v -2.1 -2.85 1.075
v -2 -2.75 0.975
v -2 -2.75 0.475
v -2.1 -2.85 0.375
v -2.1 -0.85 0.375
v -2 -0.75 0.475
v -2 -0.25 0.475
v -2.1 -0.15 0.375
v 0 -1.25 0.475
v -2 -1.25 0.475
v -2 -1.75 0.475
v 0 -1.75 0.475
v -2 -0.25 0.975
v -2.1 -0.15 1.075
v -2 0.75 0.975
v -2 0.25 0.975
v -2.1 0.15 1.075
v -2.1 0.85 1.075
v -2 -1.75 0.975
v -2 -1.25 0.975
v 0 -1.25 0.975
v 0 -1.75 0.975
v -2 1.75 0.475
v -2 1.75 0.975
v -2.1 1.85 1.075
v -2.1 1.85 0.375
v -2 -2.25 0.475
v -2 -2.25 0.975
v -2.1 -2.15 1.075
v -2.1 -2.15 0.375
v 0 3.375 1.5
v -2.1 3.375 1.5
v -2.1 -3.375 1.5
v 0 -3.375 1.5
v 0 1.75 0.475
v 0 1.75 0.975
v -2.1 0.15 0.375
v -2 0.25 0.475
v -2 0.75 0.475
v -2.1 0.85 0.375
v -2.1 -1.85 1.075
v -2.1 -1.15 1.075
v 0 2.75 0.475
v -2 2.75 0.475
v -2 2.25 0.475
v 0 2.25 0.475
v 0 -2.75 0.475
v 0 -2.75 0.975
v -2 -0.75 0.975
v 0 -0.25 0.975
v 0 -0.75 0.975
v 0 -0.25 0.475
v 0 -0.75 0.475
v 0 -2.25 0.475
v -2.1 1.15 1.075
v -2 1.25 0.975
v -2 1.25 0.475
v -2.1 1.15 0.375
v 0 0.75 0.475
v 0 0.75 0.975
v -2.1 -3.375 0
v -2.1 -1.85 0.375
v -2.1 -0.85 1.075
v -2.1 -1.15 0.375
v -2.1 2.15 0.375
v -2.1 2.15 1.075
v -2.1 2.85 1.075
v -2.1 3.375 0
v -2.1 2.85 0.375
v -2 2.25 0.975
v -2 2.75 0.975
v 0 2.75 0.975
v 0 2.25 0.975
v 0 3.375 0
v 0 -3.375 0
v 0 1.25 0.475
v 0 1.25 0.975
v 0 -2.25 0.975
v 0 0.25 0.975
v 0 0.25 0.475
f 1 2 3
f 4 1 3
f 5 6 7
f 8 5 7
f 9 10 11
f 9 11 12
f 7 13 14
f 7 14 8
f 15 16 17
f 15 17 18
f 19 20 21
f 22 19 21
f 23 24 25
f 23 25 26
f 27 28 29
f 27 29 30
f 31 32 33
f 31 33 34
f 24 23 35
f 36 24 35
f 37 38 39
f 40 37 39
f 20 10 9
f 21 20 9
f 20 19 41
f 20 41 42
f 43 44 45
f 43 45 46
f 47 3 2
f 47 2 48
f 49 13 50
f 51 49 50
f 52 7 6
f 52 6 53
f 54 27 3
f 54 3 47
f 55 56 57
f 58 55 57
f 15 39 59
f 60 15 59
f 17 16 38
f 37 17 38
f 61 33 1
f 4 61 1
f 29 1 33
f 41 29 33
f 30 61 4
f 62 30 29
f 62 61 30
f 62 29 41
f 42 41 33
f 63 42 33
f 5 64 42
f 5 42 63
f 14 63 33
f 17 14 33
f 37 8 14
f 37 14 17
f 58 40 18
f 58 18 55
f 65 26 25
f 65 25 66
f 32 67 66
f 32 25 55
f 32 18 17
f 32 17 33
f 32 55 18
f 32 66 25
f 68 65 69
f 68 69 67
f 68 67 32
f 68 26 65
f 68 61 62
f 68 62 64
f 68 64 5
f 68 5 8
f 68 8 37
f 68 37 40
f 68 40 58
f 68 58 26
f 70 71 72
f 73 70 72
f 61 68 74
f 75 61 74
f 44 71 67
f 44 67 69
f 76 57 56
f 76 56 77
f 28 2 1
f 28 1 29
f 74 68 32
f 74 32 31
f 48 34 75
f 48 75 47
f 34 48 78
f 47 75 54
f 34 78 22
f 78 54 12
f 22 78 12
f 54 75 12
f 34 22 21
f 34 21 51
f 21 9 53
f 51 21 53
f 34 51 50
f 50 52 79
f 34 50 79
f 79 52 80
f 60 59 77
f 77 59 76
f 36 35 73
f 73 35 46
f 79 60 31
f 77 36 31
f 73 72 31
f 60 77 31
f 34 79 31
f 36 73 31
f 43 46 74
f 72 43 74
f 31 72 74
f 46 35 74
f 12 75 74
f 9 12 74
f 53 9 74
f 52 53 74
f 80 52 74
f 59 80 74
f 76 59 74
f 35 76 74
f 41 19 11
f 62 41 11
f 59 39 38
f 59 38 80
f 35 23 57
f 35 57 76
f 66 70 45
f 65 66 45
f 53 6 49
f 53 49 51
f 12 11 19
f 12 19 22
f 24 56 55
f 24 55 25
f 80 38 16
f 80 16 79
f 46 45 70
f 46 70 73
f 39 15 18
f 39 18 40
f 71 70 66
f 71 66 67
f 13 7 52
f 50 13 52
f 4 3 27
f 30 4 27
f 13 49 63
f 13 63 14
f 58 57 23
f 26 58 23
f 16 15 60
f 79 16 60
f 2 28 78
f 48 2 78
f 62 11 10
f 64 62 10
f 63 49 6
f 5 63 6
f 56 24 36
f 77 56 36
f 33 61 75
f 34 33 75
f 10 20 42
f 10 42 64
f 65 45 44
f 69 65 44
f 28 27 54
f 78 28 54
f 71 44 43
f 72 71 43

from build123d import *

# Parameters (mm, degrees)
BOX121_W        = 2.1
BOX121_H        = 6.75
BOX121_DEPTH    = 1.5
BOX122_W        = 3.5
BOX122_H        = 0.5
BOX122_DEPTH    = 0.5
BOX123_W        = 3.5
BOX123_H        = 0.5
BOX123_DEPTH    = 0.5
BOX124_W        = 3
BOX124_H        = 0.5
BOX124_DEPTH    = 0.5
BOX125_W        = 3.5
BOX125_H        = 0.5
BOX125_DEPTH    = 0.5
BOX126_W        = 3.5
BOX126_H        = 0.5
BOX126_DEPTH    = 0.5
BOX175_W        = 3.5
BOX175_H        = 0.5
BOX175_DEPTH    = 0.5
CHAMFER062_SIZE = 0.1


with BuildPart() as part:
    # Box121 → Box121 (join)
    with BuildSketch(Plane(origin=(-2.1, -1.375, 0), x_dir=(1, 0, 0), z_dir=(0, 0, 1))):
        with Locations((1.05, 3.375)):
            Rectangle(BOX121_W, BOX121_H)
    extrude(amount=BOX121_DEPTH)

    # Box122 → Box122 (cut)
    with BuildSketch(Plane(origin=(-2.2, 4.25, 0.475), x_dir=(1, 0, 0), z_dir=(0, 0, 1))):
        with Locations((1.75, 0.25)):
            Rectangle(BOX122_W, BOX122_H)
    extrude(amount=BOX122_DEPTH, mode=Mode.SUBTRACT)

    # Box123 → Box123 (cut)
    with BuildSketch(Plane(origin=(-2.5, 3.25, 0.475), x_dir=(1, 0, 0), z_dir=(0, 0, 1))):
        with Locations((1.75, 0.25)):
            Rectangle(BOX123_W, BOX123_H)
    extrude(amount=BOX123_DEPTH, mode=Mode.SUBTRACT)

    # Box124 → Box124 (cut)
    with BuildSketch(Plane(origin=(-2.5, 2.25, 0.475), x_dir=(1, 0, 0), z_dir=(0, 0, 1))):
        with Locations((1.5, 0.25)):
            Rectangle(BOX124_W, BOX124_H)
    extrude(amount=BOX124_DEPTH, mode=Mode.SUBTRACT)

    # Box125 → Box125 (cut)
    with BuildSketch(Plane(origin=(-2.5, 1.25, 0.475), x_dir=(1, 0, 0), z_dir=(0, 0, 1))):
        with Locations((1.75, 0.25)):
            Rectangle(BOX125_W, BOX125_H)
    extrude(amount=BOX125_DEPTH, mode=Mode.SUBTRACT)

    # Box126 → Box126 (cut)
    with BuildSketch(Plane(origin=(-2.5, 0.25, 0.475), x_dir=(1, 0, 0), z_dir=(0, 0, 1))):
        with Locations((1.75, 0.25)):
            Rectangle(BOX126_W, BOX126_H)
    extrude(amount=BOX126_DEPTH, mode=Mode.SUBTRACT)

    # Box175 → Box175 (cut)
    with BuildSketch(Plane(origin=(-3, -0.75, 0.475), x_dir=(1, 0, 0), z_dir=(0, 0, 1))):
        with Locations((1.75, 0.25)):
            Rectangle(BOX175_W, BOX175_H)
    extrude(amount=BOX175_DEPTH, mode=Mode.SUBTRACT)

    # Chamfer062
    chamfer062_edges = [part.edges().sort_by_distance(p)[0] for p in [
        (-2.1, 4.5, 0.975),
        (-2.1, 4.75, 0.725),
        (-2.1, 4.5, 0.475),
        (-2.1, 4.25, 0.725),
        (-2.1, 3.75, 0.725),
        (-2.1, 3.5, 0.975),
        (-2.1, 3.25, 0.725),
        (-2.1, 3.5, 0.475),
        (-2.1, 2.75, 0.725),
        (-2.1, 2.5, 0.975),
        (-2.1, 2.5, 0.475),
        (-2.1, 2.25, 0.725),
        (-2.1, 1.75, 0.725),
        (-2.1, 1.5, 0.975),
        (-2.1, 1.5, 0.475),
        (-2.1, 1.25, 0.725),
        (-2.1, 0.75, 0.725),
        (-2.1, 0.5, 0.975),
        (-2.1, 0.5, 0.475),
        (-2.1, 0.25, 0.725),
        (-2.1, -0.25, 0.725),
        (-2.1, -0.5, 0.975),
        (-2.1, -0.5, 0.475),
        (-2.1, -0.75, 0.725),
    ]]
    chamfer(chamfer062_edges, length=CHAMFER062_SIZE)


with BuildPart() as part_1:
    # Body042 placement: moved
    add(part.part.moved(Location((0, -2, 0))))


solid = part_1.part
